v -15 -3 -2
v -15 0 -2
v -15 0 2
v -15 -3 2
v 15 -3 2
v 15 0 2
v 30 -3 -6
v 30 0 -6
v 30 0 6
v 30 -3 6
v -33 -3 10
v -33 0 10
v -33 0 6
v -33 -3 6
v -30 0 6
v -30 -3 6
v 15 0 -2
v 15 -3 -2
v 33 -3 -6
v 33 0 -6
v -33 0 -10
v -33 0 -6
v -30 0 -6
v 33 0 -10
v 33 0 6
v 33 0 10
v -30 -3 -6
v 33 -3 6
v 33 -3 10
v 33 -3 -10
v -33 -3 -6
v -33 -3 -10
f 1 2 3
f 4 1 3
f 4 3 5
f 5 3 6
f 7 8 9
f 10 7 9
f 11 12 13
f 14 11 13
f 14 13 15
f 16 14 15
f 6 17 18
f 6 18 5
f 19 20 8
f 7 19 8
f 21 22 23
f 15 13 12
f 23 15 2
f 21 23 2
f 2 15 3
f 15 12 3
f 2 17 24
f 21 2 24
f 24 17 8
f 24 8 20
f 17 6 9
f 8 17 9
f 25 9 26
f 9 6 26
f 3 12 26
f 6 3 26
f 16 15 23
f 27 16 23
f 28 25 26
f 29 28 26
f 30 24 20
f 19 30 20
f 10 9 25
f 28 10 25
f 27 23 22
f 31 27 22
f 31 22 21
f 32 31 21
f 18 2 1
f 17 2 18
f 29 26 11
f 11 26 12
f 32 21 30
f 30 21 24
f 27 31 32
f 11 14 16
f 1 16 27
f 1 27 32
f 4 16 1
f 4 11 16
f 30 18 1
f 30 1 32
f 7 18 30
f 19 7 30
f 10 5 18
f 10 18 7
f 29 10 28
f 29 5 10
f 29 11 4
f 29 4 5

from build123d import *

# Parameters (mm, degrees)
F0_W     = 30
F0_H     = 4
F1_DEPTH = 3


with BuildPart() as f1:
    # F0 (on Front) → F1 (new body)
    with BuildSketch(Plane.XZ):
        Polygon((33, 10), (-33, 10), (-33, 6), (-30, 6), (-30, -6), (-33, -6), (-33, -10), (33, -10), (33, -6), (30, -6), (30, 6), (33, 6), align=None)
        Rectangle(F0_W, F0_H, mode=Mode.SUBTRACT)
    extrude(amount=F1_DEPTH)


solid = f1.part
